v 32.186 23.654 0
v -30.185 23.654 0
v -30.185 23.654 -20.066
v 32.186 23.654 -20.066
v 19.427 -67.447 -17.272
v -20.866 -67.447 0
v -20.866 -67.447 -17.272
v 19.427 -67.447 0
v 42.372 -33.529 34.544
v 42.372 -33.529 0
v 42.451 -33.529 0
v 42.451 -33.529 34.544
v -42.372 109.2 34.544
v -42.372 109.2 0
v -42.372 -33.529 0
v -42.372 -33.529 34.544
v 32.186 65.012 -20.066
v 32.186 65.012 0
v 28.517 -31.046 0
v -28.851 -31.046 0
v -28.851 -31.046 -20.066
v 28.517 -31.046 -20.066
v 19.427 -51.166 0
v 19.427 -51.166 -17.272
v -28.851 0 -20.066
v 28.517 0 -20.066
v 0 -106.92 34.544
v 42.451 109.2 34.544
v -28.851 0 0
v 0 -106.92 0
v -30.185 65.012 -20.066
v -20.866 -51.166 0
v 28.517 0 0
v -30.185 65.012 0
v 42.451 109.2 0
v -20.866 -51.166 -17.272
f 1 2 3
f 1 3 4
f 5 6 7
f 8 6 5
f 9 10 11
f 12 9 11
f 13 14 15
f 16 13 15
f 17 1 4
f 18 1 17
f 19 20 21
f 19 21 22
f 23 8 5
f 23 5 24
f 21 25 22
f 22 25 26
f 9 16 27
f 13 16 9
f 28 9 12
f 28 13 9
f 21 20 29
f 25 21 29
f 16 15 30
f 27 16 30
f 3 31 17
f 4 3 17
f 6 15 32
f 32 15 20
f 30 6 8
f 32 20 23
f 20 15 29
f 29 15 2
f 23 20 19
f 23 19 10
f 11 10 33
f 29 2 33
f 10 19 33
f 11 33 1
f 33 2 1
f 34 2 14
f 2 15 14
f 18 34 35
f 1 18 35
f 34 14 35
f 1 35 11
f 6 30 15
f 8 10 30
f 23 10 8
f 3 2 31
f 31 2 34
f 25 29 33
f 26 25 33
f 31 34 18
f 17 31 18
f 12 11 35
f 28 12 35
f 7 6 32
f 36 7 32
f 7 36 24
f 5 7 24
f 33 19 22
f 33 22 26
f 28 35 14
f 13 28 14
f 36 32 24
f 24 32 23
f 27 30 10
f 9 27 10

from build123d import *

# Parameters (mm, degrees)
F1_DEPTH = 34.544
F2_W     = 40.292801
F2_H     = 16.280751
F3_DEPTH = 17.272
F4_W     = 62.371195
F4_H     = 41.358443
F4_W_2   = 57.368159
F4_H_2   = 31.046361
F5_DEPTH = 20.066


with BuildPart() as f1:
    # F0 (on Top) → F1 (new body)
    with BuildSketch(Plane.XY):
        Polygon((-42.372001, 77.851459), (-42.372001, -33.529375), (42.372001, -33.529375), (42.451348, -33.529375), (42.451348, 77.851459), (42.451348, 109.199524), (-42.372001, 109.199524), align=None)
        Polygon((42.372001, -33.529375), (-42.372001, -33.529375), (0, -106.919833), align=None)
    extrude(amount=F1_DEPTH)

    # F2 (on Top) → F3 (join)
    with BuildSketch(Plane.XY):
        with Locations((-0.719514, -59.306254)):
            Rectangle(F2_W, F2_H)
    extrude(amount=-F3_DEPTH)

    # F4 (on Top) → F5 (join)
    with BuildSketch(Plane.XY):
        with Locations((1.000606, 44.332735)):
            Rectangle(F4_W, F4_H)
        with Locations((-0.166768, -15.52318)):
            Rectangle(F4_W_2, F4_H_2)
    extrude(amount=-F5_DEPTH)


solid = f1.part
